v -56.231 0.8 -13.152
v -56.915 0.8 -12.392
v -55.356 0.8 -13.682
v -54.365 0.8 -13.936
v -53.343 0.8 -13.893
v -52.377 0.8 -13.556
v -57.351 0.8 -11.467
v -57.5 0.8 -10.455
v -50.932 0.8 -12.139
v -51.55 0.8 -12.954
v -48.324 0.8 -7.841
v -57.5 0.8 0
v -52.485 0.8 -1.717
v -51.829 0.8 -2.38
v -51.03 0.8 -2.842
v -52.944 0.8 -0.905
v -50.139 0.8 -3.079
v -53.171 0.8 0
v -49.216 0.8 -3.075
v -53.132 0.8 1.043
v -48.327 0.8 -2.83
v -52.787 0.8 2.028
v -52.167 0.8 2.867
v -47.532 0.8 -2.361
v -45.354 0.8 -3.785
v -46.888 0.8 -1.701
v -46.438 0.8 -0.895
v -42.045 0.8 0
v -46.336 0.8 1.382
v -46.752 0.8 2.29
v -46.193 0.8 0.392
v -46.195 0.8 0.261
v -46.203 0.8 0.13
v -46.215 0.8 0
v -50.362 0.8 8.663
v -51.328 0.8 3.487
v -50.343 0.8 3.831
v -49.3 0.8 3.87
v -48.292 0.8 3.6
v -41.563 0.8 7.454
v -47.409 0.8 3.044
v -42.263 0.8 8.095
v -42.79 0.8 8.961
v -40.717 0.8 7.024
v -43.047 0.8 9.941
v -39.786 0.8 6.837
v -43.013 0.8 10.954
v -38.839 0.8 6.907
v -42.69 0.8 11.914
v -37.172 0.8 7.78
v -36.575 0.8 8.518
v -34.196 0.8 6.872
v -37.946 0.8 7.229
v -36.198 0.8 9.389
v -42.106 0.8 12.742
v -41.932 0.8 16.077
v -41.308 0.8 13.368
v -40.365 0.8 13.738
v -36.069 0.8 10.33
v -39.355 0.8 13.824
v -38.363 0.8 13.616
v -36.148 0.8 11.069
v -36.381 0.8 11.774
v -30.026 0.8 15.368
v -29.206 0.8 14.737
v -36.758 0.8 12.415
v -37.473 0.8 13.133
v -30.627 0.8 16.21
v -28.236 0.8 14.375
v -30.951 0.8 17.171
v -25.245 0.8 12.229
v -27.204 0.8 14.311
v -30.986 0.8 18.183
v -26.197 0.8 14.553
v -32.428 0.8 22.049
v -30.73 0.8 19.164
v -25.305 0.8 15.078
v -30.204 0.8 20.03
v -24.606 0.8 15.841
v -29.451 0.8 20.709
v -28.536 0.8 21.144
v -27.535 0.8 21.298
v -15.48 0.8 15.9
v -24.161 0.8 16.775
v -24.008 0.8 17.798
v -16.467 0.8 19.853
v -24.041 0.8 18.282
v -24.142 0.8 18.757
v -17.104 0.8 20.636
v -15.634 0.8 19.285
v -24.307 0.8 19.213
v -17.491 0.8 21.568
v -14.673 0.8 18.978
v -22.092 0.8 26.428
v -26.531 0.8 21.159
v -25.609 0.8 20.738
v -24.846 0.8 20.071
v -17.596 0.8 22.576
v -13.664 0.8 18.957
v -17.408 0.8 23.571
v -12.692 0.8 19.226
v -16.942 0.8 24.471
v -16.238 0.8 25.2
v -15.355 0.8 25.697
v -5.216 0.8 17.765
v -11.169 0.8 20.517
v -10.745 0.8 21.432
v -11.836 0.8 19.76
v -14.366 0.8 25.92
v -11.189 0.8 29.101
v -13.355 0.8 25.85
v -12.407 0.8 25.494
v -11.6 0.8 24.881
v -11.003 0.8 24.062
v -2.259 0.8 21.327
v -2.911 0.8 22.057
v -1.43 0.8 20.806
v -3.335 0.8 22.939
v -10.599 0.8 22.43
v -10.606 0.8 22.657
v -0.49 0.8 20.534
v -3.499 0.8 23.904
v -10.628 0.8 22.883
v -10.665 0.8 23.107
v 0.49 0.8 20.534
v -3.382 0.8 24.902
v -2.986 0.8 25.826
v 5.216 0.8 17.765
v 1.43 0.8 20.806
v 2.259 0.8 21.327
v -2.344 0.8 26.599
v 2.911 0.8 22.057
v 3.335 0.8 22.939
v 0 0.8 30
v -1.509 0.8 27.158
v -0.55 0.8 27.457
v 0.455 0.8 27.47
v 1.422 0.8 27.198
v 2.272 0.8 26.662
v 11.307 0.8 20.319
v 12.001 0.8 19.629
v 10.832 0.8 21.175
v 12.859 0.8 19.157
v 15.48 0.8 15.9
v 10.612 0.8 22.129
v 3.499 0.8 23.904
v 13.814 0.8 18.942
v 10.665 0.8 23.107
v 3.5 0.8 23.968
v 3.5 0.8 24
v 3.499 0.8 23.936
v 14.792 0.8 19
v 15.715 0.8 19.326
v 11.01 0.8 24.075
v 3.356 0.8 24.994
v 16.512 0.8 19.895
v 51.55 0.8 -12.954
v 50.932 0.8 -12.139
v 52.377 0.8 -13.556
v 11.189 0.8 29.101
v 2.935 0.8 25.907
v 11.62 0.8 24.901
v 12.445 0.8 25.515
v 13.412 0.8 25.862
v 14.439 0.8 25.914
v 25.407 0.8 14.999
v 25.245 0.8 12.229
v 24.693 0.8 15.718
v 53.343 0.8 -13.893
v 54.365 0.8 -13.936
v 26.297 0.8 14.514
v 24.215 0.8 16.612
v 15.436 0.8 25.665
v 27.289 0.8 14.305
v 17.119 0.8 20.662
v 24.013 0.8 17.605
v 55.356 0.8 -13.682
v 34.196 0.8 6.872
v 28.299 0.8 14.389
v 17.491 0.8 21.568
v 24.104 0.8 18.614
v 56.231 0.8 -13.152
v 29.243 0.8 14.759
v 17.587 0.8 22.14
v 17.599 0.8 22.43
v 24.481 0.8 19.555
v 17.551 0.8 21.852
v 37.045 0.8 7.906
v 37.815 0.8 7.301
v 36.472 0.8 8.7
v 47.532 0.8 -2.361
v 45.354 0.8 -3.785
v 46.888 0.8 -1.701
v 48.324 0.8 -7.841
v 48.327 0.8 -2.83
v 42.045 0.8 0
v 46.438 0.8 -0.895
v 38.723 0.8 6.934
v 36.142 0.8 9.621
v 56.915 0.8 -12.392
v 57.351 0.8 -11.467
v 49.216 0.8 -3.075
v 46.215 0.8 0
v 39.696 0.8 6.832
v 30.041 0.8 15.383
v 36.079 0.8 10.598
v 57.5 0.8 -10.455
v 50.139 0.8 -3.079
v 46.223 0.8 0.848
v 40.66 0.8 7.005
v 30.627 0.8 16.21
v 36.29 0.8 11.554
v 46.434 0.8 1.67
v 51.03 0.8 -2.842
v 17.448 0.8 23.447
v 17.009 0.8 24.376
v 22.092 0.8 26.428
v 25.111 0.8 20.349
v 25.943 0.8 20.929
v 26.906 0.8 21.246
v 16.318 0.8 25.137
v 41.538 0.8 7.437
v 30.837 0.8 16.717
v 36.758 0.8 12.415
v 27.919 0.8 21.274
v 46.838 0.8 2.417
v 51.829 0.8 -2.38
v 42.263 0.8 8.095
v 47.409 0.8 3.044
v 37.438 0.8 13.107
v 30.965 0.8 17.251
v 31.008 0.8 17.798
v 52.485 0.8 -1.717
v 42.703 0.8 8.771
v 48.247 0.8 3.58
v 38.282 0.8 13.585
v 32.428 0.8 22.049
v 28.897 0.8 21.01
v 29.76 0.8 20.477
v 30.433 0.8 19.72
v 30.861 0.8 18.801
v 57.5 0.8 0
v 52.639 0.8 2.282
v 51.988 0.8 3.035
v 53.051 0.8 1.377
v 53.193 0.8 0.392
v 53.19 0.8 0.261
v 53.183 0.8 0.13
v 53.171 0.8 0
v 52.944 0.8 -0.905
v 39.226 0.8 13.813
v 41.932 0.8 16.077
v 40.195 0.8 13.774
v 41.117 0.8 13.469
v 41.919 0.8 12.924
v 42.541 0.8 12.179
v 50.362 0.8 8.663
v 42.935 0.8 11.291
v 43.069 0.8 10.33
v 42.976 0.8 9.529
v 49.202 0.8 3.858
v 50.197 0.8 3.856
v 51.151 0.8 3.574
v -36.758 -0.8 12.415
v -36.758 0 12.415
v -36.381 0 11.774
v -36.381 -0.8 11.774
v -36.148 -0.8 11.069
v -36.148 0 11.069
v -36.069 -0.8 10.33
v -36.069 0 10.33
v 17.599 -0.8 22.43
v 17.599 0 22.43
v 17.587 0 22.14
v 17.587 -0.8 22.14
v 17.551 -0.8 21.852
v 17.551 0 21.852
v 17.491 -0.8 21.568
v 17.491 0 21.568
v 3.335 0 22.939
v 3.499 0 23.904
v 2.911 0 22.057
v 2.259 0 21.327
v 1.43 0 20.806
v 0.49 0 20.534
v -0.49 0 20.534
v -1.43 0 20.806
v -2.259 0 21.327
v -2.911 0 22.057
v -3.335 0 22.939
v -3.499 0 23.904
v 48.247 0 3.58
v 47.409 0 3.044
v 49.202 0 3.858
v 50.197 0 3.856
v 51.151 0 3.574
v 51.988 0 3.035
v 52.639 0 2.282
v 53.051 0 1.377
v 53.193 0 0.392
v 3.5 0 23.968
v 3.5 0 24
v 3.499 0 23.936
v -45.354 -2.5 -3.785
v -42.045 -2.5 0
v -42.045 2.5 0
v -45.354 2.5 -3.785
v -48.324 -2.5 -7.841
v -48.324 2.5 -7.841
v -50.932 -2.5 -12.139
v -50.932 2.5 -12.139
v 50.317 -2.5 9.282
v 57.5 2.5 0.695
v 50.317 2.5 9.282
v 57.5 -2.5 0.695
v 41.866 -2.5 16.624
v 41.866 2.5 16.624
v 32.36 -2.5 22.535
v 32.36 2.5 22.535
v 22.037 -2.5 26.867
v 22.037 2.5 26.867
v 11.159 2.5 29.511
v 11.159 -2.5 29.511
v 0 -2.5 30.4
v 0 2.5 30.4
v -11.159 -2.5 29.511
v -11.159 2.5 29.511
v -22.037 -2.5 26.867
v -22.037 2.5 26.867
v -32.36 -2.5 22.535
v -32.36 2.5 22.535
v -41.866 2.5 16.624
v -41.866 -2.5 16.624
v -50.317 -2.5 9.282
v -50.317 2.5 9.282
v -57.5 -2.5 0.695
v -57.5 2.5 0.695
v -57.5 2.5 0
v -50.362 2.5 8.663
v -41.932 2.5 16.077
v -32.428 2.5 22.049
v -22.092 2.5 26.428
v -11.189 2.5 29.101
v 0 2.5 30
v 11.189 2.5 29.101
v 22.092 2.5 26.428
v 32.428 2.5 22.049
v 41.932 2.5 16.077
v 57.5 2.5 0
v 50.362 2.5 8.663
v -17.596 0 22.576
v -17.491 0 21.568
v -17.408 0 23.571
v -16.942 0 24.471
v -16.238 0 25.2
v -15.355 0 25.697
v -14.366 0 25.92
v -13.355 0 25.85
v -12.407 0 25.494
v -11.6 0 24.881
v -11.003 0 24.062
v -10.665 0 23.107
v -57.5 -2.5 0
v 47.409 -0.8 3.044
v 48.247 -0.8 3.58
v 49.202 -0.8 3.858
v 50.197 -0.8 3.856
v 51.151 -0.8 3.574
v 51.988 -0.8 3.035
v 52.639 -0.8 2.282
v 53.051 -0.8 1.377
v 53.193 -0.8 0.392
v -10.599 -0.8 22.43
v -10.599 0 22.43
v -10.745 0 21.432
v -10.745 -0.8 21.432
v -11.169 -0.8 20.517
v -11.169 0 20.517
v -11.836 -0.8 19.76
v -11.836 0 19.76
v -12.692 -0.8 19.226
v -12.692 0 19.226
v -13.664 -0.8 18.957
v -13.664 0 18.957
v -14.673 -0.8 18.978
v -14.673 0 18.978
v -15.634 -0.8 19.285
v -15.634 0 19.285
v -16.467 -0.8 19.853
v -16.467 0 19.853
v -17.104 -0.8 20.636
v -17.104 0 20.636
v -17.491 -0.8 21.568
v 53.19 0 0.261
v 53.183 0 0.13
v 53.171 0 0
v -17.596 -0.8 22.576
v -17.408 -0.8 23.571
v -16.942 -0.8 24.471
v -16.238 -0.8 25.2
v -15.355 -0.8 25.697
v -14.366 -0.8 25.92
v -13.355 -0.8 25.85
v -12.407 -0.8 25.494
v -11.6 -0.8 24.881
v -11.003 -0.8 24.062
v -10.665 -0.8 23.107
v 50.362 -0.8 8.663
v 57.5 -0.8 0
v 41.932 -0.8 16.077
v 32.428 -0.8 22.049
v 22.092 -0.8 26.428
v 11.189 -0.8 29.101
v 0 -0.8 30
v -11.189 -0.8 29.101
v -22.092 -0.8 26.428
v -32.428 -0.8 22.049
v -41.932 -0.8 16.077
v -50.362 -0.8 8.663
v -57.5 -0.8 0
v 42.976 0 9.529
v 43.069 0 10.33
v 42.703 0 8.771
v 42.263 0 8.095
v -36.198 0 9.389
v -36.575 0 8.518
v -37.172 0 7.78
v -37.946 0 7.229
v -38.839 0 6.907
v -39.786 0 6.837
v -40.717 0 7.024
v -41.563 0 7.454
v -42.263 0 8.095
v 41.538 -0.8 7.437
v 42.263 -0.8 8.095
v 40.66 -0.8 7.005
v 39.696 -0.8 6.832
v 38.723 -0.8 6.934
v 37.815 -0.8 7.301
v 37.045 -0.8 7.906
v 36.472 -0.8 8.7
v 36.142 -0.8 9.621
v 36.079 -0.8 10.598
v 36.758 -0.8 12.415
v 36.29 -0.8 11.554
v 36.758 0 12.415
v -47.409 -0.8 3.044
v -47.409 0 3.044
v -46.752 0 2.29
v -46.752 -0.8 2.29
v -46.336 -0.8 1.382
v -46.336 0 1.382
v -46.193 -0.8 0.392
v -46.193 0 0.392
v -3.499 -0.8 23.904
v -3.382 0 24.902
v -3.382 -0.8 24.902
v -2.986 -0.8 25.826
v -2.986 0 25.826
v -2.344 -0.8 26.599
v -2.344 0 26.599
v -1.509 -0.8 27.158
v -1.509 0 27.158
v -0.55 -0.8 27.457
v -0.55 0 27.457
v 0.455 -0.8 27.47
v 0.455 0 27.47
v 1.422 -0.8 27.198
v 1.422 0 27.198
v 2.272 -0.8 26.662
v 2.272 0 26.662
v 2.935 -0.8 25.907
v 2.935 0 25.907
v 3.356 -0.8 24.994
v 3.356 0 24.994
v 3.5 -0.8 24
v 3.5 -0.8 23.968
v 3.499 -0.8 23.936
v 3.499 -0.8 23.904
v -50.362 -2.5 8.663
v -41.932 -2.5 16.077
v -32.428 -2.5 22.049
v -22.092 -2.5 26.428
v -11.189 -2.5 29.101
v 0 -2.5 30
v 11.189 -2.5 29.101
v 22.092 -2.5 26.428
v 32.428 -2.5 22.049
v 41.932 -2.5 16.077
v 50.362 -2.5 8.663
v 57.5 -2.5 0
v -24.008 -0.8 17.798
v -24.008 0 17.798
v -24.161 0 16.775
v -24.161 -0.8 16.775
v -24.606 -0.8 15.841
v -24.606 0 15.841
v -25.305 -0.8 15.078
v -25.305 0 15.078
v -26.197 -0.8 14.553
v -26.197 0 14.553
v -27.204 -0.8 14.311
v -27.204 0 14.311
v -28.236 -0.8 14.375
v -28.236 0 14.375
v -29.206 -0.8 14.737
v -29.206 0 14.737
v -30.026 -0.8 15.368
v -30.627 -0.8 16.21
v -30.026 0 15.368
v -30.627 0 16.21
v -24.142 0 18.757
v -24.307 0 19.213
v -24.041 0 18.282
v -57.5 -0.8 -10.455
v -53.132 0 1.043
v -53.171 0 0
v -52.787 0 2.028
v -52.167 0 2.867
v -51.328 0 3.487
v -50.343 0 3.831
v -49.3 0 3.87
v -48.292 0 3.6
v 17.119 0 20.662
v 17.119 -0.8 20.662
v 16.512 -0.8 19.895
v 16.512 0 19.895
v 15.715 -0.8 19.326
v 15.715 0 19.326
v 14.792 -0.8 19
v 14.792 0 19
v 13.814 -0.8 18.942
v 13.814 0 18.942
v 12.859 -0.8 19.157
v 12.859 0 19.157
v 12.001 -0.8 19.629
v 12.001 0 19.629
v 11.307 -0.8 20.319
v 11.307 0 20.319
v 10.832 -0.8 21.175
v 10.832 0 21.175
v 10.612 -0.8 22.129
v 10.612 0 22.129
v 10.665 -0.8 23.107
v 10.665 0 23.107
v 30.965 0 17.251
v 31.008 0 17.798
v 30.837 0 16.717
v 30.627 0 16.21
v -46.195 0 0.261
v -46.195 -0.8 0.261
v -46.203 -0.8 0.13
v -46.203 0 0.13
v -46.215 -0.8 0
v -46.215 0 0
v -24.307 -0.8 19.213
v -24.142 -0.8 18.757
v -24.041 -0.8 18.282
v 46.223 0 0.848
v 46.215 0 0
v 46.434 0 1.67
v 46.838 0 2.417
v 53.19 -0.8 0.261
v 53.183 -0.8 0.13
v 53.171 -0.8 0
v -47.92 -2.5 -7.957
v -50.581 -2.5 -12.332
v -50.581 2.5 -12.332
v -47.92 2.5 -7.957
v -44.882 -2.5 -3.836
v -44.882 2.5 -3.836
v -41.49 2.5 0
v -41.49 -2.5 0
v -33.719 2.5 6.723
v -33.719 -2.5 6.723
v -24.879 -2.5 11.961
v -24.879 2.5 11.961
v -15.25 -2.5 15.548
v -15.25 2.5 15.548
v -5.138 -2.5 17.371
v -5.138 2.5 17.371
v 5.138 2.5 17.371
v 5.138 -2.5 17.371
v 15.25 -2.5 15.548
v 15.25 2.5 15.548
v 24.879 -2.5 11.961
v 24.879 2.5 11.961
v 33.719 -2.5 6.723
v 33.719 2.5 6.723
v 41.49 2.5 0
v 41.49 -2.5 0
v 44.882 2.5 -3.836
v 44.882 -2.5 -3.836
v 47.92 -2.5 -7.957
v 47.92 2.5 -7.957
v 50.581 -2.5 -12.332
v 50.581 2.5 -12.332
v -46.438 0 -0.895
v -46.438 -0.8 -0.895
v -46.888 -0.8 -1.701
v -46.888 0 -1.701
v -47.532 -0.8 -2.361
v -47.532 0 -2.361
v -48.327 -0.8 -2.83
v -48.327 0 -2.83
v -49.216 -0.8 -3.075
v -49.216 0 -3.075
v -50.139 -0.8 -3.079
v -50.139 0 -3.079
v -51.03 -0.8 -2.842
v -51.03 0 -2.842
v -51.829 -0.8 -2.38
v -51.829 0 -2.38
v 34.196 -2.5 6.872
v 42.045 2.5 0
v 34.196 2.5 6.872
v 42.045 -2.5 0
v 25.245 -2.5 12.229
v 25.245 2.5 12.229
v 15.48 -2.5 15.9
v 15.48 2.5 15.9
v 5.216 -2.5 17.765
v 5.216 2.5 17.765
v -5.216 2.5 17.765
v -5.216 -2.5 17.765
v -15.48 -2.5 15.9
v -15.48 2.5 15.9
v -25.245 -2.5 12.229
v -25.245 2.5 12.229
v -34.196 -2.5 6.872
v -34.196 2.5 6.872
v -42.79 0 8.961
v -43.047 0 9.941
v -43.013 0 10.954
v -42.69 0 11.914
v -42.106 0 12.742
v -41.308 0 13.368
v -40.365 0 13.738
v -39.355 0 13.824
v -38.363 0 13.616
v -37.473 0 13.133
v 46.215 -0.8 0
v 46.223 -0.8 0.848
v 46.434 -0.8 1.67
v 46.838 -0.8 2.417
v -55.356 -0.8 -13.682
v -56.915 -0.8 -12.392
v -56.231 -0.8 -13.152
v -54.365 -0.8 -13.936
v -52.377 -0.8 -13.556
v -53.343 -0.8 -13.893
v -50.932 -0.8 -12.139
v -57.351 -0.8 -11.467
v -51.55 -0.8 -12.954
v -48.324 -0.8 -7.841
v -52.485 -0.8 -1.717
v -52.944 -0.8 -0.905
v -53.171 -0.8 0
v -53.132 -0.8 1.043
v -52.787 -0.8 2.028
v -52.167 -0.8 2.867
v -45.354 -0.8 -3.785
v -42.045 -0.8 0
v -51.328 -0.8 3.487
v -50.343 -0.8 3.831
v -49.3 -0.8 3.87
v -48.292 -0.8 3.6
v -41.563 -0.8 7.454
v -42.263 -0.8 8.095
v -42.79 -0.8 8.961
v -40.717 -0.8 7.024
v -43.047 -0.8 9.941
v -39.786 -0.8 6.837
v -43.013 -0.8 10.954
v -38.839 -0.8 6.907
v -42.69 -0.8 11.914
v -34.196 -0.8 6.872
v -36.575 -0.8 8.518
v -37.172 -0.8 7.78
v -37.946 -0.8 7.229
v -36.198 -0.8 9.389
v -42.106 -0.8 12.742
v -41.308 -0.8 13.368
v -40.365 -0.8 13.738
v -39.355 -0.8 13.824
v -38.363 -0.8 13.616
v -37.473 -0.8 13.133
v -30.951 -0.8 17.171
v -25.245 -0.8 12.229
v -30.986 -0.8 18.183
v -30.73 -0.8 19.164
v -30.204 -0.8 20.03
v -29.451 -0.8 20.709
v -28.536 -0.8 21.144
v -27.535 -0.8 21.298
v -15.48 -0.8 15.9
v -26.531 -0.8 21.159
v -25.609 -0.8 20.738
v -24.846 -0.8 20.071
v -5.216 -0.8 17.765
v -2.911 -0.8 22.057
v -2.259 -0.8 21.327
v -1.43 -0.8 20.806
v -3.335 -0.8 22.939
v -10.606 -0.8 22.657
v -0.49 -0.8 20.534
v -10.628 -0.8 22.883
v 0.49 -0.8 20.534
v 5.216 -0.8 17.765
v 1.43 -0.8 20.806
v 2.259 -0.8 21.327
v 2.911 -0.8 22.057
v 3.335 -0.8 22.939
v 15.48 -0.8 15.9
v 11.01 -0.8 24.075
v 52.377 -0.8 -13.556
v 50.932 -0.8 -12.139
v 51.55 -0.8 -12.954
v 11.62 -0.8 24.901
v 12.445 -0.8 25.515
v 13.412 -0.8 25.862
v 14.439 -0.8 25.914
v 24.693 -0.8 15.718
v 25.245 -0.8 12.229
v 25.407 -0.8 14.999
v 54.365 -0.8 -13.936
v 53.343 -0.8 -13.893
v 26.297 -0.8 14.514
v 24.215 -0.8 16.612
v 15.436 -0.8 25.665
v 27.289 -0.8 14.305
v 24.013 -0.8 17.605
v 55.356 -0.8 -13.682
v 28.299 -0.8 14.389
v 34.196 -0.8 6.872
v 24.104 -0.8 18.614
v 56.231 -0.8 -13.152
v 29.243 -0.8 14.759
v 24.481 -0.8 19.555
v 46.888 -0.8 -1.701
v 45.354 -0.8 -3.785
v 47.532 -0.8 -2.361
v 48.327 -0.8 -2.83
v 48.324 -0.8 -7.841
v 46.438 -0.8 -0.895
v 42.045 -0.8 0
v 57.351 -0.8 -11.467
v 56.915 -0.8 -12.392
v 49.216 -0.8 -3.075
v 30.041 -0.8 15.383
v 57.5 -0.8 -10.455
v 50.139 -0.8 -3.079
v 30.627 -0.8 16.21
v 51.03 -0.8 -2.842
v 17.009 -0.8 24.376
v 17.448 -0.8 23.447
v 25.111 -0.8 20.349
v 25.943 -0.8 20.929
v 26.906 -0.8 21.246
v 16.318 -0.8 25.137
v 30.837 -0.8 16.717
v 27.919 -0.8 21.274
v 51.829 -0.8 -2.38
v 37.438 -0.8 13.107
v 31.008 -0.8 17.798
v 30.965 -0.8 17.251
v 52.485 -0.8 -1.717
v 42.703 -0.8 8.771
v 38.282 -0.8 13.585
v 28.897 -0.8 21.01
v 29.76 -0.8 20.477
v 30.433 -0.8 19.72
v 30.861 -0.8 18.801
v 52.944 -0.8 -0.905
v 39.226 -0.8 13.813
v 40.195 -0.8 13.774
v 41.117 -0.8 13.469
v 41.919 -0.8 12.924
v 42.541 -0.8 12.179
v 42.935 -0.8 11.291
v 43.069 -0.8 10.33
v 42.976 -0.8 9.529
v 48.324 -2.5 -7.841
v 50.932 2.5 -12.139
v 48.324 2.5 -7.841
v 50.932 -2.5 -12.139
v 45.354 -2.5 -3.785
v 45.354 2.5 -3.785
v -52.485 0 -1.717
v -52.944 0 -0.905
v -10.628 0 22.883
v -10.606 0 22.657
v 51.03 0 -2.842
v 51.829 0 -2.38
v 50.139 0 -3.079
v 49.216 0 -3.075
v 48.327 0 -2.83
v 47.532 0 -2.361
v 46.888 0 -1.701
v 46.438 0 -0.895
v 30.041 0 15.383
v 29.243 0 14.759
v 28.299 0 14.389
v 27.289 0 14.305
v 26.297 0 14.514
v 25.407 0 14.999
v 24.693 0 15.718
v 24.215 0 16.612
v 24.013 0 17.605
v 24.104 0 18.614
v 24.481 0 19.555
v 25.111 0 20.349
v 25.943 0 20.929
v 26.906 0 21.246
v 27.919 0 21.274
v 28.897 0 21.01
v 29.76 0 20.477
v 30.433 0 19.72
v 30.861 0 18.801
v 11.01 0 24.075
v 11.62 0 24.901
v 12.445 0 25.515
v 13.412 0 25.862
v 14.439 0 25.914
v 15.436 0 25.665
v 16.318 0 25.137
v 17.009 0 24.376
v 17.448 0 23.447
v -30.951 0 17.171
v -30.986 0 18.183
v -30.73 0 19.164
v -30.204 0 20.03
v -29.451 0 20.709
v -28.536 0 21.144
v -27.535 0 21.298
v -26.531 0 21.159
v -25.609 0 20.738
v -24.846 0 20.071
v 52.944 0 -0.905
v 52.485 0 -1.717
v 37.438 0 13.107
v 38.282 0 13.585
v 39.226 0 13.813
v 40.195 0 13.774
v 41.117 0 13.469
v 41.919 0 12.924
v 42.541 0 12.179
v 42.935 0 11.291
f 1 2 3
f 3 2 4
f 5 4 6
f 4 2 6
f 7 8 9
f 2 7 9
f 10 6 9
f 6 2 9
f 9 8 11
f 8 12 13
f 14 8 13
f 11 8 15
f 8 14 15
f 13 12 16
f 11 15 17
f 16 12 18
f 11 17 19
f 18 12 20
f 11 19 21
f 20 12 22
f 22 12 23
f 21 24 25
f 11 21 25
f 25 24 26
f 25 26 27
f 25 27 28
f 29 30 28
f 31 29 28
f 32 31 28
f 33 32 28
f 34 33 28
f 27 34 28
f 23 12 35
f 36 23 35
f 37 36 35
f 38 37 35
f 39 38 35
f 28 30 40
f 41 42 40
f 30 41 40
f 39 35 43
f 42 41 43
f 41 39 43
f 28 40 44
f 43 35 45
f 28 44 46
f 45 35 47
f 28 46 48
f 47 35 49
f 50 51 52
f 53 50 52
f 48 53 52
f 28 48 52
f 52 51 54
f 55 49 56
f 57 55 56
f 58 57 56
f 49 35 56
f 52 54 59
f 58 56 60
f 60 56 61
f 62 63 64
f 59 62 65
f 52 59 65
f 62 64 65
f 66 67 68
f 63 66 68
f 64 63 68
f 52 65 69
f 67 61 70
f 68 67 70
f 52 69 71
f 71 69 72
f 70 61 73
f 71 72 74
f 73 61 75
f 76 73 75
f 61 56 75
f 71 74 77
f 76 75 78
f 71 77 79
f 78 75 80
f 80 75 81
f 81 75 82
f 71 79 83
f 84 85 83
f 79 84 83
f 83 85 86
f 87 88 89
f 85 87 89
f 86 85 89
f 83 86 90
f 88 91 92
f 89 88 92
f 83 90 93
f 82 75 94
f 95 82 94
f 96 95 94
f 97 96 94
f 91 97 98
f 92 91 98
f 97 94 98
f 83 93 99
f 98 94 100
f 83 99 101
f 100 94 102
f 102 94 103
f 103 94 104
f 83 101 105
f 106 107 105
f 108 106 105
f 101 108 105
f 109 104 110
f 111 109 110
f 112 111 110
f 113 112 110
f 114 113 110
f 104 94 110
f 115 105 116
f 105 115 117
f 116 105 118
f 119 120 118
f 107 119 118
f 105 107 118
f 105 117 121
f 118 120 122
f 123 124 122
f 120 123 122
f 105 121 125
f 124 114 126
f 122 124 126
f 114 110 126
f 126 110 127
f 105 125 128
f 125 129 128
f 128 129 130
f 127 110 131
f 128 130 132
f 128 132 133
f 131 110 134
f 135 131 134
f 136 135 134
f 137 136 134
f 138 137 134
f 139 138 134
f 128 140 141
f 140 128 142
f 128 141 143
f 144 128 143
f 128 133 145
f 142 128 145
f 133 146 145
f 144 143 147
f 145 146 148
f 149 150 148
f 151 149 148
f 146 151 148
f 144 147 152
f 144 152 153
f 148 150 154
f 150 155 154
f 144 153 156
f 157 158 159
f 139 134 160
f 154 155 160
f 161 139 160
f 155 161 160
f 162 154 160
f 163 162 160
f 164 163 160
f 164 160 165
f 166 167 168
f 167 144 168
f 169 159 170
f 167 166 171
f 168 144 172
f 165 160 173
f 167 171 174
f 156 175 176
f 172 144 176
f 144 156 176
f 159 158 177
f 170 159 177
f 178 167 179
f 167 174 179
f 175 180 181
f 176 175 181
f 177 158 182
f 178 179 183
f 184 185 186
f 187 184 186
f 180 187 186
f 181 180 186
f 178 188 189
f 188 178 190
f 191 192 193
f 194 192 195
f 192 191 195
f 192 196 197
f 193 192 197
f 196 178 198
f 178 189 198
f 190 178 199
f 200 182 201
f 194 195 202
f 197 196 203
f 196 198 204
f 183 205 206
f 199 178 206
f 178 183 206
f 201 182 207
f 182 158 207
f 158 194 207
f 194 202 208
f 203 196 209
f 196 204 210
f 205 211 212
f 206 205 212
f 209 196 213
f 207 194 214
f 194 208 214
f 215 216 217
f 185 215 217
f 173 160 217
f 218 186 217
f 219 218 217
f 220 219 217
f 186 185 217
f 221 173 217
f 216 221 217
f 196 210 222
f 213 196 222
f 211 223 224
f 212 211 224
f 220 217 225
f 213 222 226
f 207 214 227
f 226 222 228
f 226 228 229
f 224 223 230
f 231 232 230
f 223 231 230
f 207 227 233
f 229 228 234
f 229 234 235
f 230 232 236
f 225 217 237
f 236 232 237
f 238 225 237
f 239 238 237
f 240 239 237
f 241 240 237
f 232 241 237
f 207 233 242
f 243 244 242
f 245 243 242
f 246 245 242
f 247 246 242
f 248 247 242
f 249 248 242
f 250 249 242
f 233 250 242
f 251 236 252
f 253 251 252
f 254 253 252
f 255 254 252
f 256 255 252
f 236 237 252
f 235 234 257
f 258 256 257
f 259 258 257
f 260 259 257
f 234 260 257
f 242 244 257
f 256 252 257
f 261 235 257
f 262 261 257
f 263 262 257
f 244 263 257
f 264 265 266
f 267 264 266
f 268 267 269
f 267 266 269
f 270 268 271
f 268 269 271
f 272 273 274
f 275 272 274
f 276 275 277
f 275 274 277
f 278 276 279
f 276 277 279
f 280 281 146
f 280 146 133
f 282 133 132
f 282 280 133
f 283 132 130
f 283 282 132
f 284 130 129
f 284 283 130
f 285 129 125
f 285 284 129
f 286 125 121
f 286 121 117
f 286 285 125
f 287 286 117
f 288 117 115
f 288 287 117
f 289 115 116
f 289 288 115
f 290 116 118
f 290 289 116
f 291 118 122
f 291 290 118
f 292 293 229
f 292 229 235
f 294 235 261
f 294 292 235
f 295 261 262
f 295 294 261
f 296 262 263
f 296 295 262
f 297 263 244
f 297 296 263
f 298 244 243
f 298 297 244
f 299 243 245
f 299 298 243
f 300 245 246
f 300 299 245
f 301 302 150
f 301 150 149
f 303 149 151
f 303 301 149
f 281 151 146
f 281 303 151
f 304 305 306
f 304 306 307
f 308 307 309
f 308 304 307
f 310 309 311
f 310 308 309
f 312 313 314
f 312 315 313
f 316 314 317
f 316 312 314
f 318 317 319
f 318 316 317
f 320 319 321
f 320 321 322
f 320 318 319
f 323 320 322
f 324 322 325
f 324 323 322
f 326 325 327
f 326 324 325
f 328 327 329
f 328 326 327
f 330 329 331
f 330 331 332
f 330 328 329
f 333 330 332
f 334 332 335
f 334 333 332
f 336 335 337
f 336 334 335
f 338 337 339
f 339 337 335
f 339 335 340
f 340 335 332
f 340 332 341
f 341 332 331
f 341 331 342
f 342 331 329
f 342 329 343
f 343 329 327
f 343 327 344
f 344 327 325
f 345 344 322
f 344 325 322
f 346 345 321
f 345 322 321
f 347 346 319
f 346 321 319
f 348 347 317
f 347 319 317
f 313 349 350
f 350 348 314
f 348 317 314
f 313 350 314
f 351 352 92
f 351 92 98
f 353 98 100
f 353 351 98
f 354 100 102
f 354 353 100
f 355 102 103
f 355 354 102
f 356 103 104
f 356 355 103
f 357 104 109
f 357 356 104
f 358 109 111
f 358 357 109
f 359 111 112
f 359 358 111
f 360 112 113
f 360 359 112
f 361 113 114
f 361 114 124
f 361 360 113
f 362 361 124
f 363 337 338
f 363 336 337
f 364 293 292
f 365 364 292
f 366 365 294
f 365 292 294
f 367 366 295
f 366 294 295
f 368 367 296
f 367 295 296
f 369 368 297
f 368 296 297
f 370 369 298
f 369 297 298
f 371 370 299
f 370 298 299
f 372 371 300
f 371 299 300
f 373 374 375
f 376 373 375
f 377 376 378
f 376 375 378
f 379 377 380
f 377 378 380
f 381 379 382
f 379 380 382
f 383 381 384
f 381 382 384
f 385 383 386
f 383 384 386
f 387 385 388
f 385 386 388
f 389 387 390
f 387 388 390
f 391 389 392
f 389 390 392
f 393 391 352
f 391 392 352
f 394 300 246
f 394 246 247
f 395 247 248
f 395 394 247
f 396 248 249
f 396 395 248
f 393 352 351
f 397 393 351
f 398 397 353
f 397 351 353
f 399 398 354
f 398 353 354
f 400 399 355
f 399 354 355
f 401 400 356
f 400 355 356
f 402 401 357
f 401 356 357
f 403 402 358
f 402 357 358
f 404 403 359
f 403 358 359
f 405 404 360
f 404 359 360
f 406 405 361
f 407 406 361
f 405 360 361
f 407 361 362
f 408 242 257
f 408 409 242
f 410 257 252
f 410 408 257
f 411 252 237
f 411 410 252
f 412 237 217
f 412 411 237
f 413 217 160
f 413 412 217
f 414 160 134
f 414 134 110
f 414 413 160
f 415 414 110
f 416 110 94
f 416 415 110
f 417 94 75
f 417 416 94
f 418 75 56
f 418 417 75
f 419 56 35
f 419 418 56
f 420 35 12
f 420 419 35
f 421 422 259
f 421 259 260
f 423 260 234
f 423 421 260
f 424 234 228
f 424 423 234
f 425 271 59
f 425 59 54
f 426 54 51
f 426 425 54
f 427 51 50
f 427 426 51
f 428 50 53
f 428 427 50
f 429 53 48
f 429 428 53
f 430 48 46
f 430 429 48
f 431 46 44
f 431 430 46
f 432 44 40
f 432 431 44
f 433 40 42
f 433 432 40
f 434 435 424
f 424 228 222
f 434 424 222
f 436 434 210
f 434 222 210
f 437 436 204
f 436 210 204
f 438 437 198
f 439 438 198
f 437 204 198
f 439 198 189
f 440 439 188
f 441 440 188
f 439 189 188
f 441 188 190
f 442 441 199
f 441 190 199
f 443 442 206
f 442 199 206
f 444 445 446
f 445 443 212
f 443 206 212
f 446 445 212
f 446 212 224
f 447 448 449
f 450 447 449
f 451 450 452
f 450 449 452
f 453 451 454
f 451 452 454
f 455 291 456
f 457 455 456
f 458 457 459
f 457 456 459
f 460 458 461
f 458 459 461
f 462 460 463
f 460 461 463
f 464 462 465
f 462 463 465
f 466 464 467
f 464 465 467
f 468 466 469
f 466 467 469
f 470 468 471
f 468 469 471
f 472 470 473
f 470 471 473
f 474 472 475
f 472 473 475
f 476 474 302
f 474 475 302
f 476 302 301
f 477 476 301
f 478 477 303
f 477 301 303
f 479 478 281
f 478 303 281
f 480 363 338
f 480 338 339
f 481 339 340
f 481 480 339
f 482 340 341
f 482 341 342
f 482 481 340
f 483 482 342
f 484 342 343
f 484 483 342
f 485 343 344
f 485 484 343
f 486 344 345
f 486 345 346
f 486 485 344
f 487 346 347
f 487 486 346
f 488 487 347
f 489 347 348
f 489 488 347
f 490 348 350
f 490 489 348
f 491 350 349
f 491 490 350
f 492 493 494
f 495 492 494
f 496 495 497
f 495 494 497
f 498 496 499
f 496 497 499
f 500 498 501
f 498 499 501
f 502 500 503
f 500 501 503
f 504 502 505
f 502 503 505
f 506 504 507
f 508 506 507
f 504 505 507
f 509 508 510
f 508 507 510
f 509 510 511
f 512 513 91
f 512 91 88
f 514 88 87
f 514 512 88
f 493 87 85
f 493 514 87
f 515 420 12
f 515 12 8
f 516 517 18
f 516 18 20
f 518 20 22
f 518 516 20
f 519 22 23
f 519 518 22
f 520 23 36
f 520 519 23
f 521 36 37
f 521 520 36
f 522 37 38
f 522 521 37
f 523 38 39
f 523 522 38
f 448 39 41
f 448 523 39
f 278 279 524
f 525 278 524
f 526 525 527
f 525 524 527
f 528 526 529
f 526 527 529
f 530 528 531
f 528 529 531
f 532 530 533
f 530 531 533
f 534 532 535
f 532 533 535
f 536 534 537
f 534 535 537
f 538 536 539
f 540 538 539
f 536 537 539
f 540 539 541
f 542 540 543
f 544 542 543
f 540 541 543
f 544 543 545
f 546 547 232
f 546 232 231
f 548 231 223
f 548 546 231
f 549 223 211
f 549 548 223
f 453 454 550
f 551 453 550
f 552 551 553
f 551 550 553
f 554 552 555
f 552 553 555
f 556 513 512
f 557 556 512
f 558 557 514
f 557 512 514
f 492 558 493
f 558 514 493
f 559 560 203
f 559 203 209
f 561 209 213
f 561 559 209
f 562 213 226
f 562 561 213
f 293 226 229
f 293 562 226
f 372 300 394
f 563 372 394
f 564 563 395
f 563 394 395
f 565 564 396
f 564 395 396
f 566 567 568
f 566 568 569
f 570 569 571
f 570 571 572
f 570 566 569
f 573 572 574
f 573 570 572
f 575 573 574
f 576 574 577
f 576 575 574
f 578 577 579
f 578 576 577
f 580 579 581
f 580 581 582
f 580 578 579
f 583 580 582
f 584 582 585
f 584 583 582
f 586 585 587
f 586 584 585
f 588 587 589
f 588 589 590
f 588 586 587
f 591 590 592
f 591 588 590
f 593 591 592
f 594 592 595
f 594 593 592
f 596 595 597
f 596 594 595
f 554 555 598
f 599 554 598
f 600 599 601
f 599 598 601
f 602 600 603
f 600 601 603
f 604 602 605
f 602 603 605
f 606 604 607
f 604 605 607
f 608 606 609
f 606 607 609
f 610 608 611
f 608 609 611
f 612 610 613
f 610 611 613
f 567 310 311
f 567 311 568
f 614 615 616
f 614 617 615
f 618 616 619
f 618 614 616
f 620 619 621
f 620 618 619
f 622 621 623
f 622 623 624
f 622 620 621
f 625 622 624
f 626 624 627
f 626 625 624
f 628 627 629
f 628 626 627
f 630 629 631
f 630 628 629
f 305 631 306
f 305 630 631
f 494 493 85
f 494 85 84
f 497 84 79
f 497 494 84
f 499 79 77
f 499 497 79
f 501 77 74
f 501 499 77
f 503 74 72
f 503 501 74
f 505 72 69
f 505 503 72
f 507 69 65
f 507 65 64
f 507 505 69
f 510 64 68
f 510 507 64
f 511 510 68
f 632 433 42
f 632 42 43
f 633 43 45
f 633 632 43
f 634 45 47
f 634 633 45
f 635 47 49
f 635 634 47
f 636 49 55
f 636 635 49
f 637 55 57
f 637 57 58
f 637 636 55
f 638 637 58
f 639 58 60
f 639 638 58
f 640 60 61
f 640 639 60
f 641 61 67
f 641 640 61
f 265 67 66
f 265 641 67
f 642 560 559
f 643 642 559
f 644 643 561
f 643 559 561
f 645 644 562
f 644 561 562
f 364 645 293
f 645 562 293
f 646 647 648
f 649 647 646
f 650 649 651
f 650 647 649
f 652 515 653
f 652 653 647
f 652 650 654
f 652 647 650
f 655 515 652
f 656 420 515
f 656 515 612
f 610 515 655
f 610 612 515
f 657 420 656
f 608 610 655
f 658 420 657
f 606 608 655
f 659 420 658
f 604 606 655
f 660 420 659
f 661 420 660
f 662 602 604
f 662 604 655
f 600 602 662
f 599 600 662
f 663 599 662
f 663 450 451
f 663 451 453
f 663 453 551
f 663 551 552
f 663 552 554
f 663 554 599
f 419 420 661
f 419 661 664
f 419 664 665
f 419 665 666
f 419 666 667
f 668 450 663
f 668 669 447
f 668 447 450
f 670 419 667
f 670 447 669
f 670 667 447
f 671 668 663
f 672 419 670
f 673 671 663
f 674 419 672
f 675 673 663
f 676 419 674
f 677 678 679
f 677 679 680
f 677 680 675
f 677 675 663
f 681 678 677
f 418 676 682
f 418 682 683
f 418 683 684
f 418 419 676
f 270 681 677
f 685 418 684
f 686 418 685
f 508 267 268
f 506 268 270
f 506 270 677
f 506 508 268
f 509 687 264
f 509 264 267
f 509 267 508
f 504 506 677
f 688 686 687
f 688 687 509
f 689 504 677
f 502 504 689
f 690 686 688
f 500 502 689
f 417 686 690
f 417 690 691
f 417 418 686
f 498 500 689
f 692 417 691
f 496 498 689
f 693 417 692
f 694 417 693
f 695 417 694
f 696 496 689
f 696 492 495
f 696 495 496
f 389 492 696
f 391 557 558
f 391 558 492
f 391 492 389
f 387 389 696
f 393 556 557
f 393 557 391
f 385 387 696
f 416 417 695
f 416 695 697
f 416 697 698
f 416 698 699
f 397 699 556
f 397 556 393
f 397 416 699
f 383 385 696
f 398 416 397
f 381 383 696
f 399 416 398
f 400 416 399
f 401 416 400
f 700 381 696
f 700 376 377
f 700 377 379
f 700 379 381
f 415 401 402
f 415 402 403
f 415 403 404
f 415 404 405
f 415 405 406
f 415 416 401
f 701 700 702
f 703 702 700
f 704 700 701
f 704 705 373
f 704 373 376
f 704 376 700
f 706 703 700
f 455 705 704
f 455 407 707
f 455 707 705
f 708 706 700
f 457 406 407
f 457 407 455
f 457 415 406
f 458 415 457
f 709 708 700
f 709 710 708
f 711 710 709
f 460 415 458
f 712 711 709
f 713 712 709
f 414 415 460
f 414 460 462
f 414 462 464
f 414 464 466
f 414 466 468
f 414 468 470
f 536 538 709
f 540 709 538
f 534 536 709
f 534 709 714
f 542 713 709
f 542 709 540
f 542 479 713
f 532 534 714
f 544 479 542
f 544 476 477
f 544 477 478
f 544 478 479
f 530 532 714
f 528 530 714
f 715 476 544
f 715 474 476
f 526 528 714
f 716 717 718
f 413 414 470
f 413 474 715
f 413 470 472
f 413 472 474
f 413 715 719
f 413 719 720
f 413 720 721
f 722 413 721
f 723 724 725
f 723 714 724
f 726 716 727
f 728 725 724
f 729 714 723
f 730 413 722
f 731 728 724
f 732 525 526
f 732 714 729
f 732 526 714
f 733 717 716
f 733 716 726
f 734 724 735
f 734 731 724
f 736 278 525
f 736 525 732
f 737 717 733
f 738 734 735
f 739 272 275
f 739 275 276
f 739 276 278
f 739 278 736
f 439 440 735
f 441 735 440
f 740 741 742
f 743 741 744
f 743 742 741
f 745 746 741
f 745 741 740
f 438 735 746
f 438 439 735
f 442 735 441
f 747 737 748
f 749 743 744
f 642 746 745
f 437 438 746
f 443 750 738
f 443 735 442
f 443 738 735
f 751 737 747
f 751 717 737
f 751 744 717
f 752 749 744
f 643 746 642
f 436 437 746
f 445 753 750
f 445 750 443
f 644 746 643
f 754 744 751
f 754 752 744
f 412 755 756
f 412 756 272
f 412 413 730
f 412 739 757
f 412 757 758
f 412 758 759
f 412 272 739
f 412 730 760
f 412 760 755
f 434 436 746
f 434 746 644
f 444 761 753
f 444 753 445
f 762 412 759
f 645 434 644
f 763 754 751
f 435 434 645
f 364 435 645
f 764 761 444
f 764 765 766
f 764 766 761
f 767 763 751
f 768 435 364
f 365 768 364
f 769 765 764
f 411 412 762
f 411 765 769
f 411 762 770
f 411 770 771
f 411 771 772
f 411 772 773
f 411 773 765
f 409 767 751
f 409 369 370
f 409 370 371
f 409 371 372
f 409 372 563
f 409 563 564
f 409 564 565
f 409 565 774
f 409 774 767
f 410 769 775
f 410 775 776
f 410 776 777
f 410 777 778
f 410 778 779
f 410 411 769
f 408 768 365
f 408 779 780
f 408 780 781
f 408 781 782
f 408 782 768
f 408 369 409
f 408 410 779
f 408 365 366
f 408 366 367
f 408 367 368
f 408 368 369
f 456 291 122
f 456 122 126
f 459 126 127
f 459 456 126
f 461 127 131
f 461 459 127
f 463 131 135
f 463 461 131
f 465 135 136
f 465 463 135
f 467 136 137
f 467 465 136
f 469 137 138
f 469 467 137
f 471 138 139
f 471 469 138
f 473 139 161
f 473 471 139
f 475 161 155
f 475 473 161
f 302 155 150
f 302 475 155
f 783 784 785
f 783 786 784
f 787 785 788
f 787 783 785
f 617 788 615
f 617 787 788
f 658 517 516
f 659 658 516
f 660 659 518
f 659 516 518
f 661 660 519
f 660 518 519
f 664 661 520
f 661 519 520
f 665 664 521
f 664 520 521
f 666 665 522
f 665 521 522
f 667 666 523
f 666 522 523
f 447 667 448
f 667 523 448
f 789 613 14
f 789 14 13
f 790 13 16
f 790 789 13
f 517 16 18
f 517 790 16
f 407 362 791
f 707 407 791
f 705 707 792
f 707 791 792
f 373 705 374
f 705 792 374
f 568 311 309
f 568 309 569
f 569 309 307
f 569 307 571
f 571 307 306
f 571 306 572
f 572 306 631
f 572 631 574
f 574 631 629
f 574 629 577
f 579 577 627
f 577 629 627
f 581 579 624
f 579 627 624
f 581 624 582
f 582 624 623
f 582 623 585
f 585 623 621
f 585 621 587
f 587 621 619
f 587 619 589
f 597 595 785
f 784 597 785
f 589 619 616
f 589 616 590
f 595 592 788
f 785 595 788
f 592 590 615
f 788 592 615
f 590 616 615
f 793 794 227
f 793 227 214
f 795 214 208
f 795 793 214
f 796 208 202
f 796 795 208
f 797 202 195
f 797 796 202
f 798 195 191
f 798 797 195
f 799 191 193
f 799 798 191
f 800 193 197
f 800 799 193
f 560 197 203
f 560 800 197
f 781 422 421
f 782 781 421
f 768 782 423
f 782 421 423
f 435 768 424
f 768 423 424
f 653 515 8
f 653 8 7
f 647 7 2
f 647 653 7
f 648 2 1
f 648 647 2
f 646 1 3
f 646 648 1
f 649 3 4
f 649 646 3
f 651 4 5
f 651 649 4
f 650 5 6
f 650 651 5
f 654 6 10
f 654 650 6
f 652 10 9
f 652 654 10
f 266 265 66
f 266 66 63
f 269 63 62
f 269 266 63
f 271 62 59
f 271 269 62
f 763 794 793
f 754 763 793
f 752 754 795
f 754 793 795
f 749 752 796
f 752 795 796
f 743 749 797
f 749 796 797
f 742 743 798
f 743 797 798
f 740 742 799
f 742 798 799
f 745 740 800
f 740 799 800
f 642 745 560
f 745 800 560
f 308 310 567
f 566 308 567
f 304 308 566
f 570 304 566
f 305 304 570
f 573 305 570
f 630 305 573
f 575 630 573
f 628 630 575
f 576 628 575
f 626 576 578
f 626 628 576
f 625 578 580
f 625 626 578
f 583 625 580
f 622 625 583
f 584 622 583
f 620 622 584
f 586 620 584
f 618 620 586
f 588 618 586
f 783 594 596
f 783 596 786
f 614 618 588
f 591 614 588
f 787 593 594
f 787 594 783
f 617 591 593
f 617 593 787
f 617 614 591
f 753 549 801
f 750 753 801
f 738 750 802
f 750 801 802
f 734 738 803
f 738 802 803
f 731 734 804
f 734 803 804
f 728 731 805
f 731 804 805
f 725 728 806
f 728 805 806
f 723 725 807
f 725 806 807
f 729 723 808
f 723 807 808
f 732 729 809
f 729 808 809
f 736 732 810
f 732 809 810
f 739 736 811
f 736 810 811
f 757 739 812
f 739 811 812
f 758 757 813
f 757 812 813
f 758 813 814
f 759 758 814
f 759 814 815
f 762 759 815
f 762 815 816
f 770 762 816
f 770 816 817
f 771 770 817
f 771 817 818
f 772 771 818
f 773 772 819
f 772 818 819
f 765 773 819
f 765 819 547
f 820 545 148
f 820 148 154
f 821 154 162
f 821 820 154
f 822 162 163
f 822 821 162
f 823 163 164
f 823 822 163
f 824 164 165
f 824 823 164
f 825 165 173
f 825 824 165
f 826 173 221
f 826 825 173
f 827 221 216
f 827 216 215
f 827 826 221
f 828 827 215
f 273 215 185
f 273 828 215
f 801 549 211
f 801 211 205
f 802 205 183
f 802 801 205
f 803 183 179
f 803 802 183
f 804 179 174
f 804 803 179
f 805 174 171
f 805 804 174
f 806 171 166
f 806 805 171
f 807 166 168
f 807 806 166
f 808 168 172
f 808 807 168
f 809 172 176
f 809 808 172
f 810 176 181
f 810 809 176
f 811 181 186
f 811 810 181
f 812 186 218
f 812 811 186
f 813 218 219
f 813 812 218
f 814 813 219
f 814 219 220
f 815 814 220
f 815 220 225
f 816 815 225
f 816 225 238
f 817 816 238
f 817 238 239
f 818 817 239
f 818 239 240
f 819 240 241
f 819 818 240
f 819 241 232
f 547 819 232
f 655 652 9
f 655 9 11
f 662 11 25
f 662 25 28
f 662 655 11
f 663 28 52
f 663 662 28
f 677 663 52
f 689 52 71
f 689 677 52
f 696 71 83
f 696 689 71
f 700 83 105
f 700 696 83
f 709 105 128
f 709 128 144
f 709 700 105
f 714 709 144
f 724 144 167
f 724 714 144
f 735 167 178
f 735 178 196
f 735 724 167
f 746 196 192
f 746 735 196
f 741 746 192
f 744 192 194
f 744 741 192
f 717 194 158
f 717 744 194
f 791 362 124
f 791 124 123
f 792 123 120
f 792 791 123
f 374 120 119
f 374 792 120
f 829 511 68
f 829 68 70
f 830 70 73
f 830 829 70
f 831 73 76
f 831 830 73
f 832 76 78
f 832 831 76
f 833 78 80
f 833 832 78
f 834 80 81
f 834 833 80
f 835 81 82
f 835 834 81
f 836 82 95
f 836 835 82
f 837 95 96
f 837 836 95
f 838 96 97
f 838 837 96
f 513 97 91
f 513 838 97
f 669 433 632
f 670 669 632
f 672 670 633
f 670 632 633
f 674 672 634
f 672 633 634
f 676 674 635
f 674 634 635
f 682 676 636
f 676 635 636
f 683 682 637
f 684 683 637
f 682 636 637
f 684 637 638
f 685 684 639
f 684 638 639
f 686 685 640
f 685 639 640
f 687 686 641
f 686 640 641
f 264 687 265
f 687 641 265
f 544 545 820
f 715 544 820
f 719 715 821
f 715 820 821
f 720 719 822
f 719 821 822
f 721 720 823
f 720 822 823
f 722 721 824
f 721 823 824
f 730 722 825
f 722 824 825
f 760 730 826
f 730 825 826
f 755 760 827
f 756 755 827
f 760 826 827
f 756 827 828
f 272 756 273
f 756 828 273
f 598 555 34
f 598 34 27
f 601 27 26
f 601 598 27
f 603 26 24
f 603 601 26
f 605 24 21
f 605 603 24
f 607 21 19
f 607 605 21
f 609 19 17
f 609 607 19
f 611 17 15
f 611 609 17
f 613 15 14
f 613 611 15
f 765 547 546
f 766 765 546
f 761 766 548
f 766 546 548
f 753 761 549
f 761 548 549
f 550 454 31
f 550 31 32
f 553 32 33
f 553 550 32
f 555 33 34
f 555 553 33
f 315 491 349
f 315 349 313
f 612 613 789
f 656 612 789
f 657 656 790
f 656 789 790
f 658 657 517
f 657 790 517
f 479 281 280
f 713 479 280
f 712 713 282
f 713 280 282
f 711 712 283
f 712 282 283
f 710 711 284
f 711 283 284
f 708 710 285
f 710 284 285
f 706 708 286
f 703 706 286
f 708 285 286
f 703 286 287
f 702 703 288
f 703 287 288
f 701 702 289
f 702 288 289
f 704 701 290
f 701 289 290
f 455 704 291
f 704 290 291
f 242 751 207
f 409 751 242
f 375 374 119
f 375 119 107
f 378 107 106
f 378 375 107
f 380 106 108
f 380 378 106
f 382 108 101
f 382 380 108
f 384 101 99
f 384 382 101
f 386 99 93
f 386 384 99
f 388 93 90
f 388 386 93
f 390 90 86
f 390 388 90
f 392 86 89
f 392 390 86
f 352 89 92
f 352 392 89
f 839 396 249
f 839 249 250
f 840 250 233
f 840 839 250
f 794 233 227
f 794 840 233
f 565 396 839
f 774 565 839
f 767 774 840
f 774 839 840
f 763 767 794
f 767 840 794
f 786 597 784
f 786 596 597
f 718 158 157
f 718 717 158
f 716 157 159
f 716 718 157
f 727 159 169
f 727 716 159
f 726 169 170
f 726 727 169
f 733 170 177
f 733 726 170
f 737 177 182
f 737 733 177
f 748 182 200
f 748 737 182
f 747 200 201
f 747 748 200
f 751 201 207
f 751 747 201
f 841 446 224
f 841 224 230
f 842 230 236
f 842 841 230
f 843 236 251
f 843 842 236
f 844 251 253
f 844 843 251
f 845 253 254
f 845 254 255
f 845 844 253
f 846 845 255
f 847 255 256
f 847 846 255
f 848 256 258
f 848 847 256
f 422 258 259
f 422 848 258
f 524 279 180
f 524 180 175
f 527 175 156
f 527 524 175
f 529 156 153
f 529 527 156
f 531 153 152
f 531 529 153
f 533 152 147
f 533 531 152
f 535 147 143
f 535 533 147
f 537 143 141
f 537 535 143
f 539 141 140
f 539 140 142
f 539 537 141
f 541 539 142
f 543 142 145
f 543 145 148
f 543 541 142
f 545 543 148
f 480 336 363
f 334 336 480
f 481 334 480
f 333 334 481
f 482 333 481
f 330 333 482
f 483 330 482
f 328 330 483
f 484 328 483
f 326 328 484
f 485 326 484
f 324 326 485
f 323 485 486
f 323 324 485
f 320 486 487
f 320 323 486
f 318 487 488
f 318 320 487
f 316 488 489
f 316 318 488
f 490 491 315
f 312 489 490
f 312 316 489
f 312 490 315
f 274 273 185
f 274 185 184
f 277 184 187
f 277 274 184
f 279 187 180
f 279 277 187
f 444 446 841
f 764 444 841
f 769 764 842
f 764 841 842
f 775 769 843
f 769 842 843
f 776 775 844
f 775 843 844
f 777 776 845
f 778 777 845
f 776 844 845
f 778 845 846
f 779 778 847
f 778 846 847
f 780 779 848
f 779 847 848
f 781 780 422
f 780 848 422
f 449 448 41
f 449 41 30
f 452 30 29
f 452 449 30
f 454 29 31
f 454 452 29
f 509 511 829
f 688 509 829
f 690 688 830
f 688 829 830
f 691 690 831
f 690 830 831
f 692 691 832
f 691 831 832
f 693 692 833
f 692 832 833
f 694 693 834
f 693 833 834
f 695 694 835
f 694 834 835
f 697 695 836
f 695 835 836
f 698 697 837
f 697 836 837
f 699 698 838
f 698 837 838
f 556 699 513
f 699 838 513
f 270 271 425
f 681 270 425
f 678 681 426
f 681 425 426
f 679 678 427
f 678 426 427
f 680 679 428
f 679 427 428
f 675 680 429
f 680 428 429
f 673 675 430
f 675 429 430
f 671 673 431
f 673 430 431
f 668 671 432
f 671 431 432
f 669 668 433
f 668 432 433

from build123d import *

# Parameters (mm, degrees)
F1_DEPTH = 0.8
F2_DEPTH = 2.5
F3_DEPTH = 2.5


with BuildPart() as f1:
    # F0 (on Front) → F1 (new body, symmetric)
    with BuildSketch(Plane.XZ):
        with BuildLine():
            ThreePointArc((57.5, 0), (0, 30), (-57.5, 0))
            Line((-57.5, 0), (-53.1707682947, 0))
            ThreePointArc((-53.1707682947, 0), (-51.3277212324, 3.4870326892), (-47.4085305315, 3.044128976))
            ThreePointArc((-47.4085305315, 3.044128976), (-44.9067619438, 5.6421655989), (-42.2628354131, 8.0953865146))
            ThreePointArc((-42.2628354131, 8.0953865146), (-41.7296173597, 13.0838243248), (-36.7575952083, 12.4146240518))
            ThreePointArc((-36.7575952083, 12.4146240518), (-33.7456732845, 14.3988031479), (-30.6269252328, 16.2104463109))
            ThreePointArc((-30.6269252328, 16.2104463109), (-29.0096045557, 20.9594574824), (-24.3065150716, 19.2130948101))
            ThreePointArc((-24.3065150716, 19.2130948101), (-20.9319439017, 20.4862443612), (-17.4911100586, 21.5675874266))
            ThreePointArc((-17.4911100586, 21.5675874266), (-14.868892468, 25.8445966839), (-10.6650619849, 23.1065969491))
            ThreePointArc((-10.6650619849, 23.1065969491), (-7.0931058293, 23.6063664791), (-3.4986955646, 23.9044523887))
            ThreePointArc((-3.4986955646, 23.9044523887), (-0.0477782576, 27.499673876), (3.5, 24))
            ThreePointArc((3.5, 24), (3.499673876, 23.9522217424), (3.4986955646, 23.9044523887))
            ThreePointArc((3.4986955646, 23.9044523887), (7.0931058293, 23.6063664791), (10.6650619849, 23.1065969491))
            ThreePointArc((10.6650619849, 23.1065969491), (14.4388537458, 25.9137708277), (17.5991008087, 22.430300153))
            ThreePointArc((17.5991008087, 22.430300153), (17.5719981851, 21.9955774683), (17.4911100586, 21.5675874266))
            ThreePointArc((17.4911100586, 21.5675874266), (20.9319439017, 20.4862443612), (24.3065150716, 19.2130948101))
            ThreePointArc((24.3065150716, 19.2130948101), (28.2308321663, 21.2225609326), (31.0077205603, 17.7980741674))
            ThreePointArc((31.0077205603, 17.7980741674), (30.9111905802, 16.9817459105), (30.6269252328, 16.2104463109))
            ThreePointArc((30.6269252328, 16.2104463109), (33.7456732845, 14.3988031479), (36.7575952083, 12.4146240518))
            ThreePointArc((36.7575952083, 12.4146240518), (40.6667831089, 13.6536244822), (43.0691934101, 10.3301779499))
            ThreePointArc((43.0691934101, 10.3301779499), (42.8614378581, 9.1422694961), (42.2628354131, 8.0953865146))
            ThreePointArc((42.2628354131, 8.0953865146), (44.9067619438, 5.6421655989), (47.4085305315, 3.044128976))
            ThreePointArc((47.4085305315, 3.044128976), (51.1514161203, 3.5739307074), (53.1928278924, 0.3923398504))
            ThreePointArc((53.1928278924, 0.3923398504), (53.1873086412, 0.1958600906), (53.1707682947, 0))
            Line((53.1707682947, 0), (57.5, 0))
        make_face()
        with BuildLine():
            ThreePointArc((-42.2628354131, 8.0953865146), (-44.9067619438, 5.6421655989), (-47.4085305315, 3.044128976))
            ThreePointArc((-47.4085305315, 3.044128976), (-46.5112370354, 1.8509280782), (-46.1928278924, 0.3923398504))
            ThreePointArc((-46.1928278924, 0.3923398504), (-46.1983471436, 0.1958600906), (-46.2148874901, 0))
            Line((-46.2148874901, 0), (-42.0446191563, 0))
            ThreePointArc((-42.0446191563, 0), (0, 18), (42.0446191563, 0))
            Line((42.0446191563, 0), (46.2148874901, 0))
            ThreePointArc((46.2148874901, 0), (46.4343733023, 1.6700227862), (47.4085305315, 3.044128976))
            ThreePointArc((47.4085305315, 3.044128976), (44.9067619438, 5.6421655989), (42.2628354131, 8.0953865146))
            ThreePointArc((42.2628354131, 8.0953865146), (37.4087694605, 7.576531575), (36.7575952083, 12.4146240518))
            ThreePointArc((36.7575952083, 12.4146240518), (33.7456732845, 14.3988031479), (30.6269252328, 16.2104463109))
            ThreePointArc((30.6269252328, 16.2104463109), (26.0058365648, 14.6366908524), (24.3065150716, 19.2130948101))
            ThreePointArc((24.3065150716, 19.2130948101), (20.9319439017, 20.4862443612), (17.4911100586, 21.5675874266))
            ThreePointArc((17.4911100586, 21.5675874266), (13.3293091493, 19.016003622), (10.6650619849, 23.1065969491))
            ThreePointArc((10.6650619849, 23.1065969491), (7.0931058293, 23.6063664791), (3.4986955646, 23.9044523887))
            ThreePointArc((3.4986955646, 23.9044523887), (0, 20.5), (-3.4986955646, 23.9044523887))
            ThreePointArc((-3.4986955646, 23.9044523887), (-7.0931058293, 23.6063664791), (-10.6650619849, 23.1065969491))
            ThreePointArc((-10.6650619849, 23.1065969491), (-10.615630134, 22.7700530901), (-10.5991008087, 22.430300153))
            ThreePointArc((-10.5991008087, 22.430300153), (-13.664378124, 18.9574027765), (-17.4911100586, 21.5675874266))
            ThreePointArc((-17.4911100586, 21.5675874266), (-20.9319439017, 20.4862443612), (-24.3065150716, 19.2130948101))
            ThreePointArc((-24.3065150716, 19.2130948101), (-24.083233795, 18.5211857735), (-24.0077205603, 17.7980741674))
            ThreePointArc((-24.0077205603, 17.7980741674), (-26.6913923033, 14.3946041474), (-30.6269252328, 16.2104463109))
            ThreePointArc((-30.6269252328, 16.2104463109), (-33.7456732845, 14.3988031479), (-36.7575952083, 12.4146240518))
            ThreePointArc((-36.7575952083, 12.4146240518), (-36.2457468778, 11.4277676487), (-36.0691934101, 10.3301779499))
            ThreePointArc((-36.0691934101, 10.3301779499), (-38.3812849563, 7.0379335019), (-42.2628354131, 8.0953865146))
        make_face()
        with BuildLine():
            Line((57.5, -10.454995503), (57.5, 0))
            Line((57.5, 0), (53.1707682947, 0))
            ThreePointArc((53.1707682947, 0), (52.7417358798, -1.3264271742), (51.8289903893, -2.3801698046))
            ThreePointArc((51.8289903893, -2.3801698046), (48.3266675572, -2.8300204551), (46.2148874901, 0))
            Line((46.2148874901, 0), (42.0446191563, 0))
            ThreePointArc((42.0446191563, 0), (46.8828961162, -5.7808766759), (50.9320257017, -12.1394935603))
            ThreePointArc((50.9320257017, -12.1394935603), (54.8695084692, -13.845269094), (57.5, -10.454995503))
        make_face()
        with BuildLine():
            Line((-53.1707682947, 0), (-57.5, 0))
            Line((-57.5, 0), (-57.5, -10.454995503))
            ThreePointArc((-57.5, -10.454995503), (-54.8695084692, -13.845269094), (-50.9320257017, -12.1394935603))
            ThreePointArc((-50.9320257017, -12.1394935603), (-46.8828961162, -5.7808766759), (-42.0446191563, 0))
            Line((-42.0446191563, 0), (-46.2148874901, 0))
            ThreePointArc((-46.2148874901, 0), (-48.3266675572, -2.8300204551), (-51.8289903893, -2.3801698046))
            ThreePointArc((-51.8289903893, -2.3801698046), (-52.7417358798, -1.3264271742), (-53.1707682947, 0))
        make_face()
    extrude(amount=F1_DEPTH, both=True)


with BuildPart() as f2:
    # F0 (on Front) → F2 (new body, symmetric)
    with BuildSketch(Plane.XZ):
        with BuildLine():
            Line((-57.5, 0.6951901587), (-57.5, 0))
            ThreePointArc((-57.5, 0), (0, 30), (57.5, 0))
            Line((57.5, 0), (57.5, 0.6951901587))
            ThreePointArc((57.5, 0.6951901587), (0, 30.4), (-57.5, 0.6951901587))
        make_face()
    extrude(amount=F2_DEPTH, both=True)


with BuildPart() as f3:
    # F0 (on Front) → F3 (new body, symmetric)
    with BuildSketch(Plane.XZ):
        with BuildLine():
            ThreePointArc((42.0446191563, 0), (0, 18), (-42.0446191563, 0))
            Line((-42.0446191563, 0), (-41.4900791355, 0))
            ThreePointArc((-41.4900791355, 0), (0, 17.6), (41.4900791355, 0))
            Line((41.4900791355, 0), (42.0446191563, 0))
        make_face()
        with BuildLine():
            Line((50.5814000676, -12.332007624), (50.9320257017, -12.1394935603))
            ThreePointArc((50.9320257017, -12.1394935603), (46.8828961162, -5.7808766759), (42.0446191563, 0))
            Line((42.0446191563, 0), (41.4900791355, 0))
            ThreePointArc((41.4900791355, 0), (46.4468397598, -5.8629352778), (50.5814000676, -12.332007624))
        make_face()
        with BuildLine():
            ThreePointArc((-42.0446191563, 0), (-46.8828961162, -5.7808766759), (-50.9320257017, -12.1394935603))
            Line((-50.9320257017, -12.1394935603), (-50.5814000676, -12.332007624))
            ThreePointArc((-50.5814000676, -12.332007624), (-46.4468397598, -5.8629352778), (-41.4900791355, 0))
            Line((-41.4900791355, 0), (-42.0446191563, 0))
        make_face()
    extrude(amount=F3_DEPTH, both=True)


solid = Compound([f1.part, f2.part, f3.part])
